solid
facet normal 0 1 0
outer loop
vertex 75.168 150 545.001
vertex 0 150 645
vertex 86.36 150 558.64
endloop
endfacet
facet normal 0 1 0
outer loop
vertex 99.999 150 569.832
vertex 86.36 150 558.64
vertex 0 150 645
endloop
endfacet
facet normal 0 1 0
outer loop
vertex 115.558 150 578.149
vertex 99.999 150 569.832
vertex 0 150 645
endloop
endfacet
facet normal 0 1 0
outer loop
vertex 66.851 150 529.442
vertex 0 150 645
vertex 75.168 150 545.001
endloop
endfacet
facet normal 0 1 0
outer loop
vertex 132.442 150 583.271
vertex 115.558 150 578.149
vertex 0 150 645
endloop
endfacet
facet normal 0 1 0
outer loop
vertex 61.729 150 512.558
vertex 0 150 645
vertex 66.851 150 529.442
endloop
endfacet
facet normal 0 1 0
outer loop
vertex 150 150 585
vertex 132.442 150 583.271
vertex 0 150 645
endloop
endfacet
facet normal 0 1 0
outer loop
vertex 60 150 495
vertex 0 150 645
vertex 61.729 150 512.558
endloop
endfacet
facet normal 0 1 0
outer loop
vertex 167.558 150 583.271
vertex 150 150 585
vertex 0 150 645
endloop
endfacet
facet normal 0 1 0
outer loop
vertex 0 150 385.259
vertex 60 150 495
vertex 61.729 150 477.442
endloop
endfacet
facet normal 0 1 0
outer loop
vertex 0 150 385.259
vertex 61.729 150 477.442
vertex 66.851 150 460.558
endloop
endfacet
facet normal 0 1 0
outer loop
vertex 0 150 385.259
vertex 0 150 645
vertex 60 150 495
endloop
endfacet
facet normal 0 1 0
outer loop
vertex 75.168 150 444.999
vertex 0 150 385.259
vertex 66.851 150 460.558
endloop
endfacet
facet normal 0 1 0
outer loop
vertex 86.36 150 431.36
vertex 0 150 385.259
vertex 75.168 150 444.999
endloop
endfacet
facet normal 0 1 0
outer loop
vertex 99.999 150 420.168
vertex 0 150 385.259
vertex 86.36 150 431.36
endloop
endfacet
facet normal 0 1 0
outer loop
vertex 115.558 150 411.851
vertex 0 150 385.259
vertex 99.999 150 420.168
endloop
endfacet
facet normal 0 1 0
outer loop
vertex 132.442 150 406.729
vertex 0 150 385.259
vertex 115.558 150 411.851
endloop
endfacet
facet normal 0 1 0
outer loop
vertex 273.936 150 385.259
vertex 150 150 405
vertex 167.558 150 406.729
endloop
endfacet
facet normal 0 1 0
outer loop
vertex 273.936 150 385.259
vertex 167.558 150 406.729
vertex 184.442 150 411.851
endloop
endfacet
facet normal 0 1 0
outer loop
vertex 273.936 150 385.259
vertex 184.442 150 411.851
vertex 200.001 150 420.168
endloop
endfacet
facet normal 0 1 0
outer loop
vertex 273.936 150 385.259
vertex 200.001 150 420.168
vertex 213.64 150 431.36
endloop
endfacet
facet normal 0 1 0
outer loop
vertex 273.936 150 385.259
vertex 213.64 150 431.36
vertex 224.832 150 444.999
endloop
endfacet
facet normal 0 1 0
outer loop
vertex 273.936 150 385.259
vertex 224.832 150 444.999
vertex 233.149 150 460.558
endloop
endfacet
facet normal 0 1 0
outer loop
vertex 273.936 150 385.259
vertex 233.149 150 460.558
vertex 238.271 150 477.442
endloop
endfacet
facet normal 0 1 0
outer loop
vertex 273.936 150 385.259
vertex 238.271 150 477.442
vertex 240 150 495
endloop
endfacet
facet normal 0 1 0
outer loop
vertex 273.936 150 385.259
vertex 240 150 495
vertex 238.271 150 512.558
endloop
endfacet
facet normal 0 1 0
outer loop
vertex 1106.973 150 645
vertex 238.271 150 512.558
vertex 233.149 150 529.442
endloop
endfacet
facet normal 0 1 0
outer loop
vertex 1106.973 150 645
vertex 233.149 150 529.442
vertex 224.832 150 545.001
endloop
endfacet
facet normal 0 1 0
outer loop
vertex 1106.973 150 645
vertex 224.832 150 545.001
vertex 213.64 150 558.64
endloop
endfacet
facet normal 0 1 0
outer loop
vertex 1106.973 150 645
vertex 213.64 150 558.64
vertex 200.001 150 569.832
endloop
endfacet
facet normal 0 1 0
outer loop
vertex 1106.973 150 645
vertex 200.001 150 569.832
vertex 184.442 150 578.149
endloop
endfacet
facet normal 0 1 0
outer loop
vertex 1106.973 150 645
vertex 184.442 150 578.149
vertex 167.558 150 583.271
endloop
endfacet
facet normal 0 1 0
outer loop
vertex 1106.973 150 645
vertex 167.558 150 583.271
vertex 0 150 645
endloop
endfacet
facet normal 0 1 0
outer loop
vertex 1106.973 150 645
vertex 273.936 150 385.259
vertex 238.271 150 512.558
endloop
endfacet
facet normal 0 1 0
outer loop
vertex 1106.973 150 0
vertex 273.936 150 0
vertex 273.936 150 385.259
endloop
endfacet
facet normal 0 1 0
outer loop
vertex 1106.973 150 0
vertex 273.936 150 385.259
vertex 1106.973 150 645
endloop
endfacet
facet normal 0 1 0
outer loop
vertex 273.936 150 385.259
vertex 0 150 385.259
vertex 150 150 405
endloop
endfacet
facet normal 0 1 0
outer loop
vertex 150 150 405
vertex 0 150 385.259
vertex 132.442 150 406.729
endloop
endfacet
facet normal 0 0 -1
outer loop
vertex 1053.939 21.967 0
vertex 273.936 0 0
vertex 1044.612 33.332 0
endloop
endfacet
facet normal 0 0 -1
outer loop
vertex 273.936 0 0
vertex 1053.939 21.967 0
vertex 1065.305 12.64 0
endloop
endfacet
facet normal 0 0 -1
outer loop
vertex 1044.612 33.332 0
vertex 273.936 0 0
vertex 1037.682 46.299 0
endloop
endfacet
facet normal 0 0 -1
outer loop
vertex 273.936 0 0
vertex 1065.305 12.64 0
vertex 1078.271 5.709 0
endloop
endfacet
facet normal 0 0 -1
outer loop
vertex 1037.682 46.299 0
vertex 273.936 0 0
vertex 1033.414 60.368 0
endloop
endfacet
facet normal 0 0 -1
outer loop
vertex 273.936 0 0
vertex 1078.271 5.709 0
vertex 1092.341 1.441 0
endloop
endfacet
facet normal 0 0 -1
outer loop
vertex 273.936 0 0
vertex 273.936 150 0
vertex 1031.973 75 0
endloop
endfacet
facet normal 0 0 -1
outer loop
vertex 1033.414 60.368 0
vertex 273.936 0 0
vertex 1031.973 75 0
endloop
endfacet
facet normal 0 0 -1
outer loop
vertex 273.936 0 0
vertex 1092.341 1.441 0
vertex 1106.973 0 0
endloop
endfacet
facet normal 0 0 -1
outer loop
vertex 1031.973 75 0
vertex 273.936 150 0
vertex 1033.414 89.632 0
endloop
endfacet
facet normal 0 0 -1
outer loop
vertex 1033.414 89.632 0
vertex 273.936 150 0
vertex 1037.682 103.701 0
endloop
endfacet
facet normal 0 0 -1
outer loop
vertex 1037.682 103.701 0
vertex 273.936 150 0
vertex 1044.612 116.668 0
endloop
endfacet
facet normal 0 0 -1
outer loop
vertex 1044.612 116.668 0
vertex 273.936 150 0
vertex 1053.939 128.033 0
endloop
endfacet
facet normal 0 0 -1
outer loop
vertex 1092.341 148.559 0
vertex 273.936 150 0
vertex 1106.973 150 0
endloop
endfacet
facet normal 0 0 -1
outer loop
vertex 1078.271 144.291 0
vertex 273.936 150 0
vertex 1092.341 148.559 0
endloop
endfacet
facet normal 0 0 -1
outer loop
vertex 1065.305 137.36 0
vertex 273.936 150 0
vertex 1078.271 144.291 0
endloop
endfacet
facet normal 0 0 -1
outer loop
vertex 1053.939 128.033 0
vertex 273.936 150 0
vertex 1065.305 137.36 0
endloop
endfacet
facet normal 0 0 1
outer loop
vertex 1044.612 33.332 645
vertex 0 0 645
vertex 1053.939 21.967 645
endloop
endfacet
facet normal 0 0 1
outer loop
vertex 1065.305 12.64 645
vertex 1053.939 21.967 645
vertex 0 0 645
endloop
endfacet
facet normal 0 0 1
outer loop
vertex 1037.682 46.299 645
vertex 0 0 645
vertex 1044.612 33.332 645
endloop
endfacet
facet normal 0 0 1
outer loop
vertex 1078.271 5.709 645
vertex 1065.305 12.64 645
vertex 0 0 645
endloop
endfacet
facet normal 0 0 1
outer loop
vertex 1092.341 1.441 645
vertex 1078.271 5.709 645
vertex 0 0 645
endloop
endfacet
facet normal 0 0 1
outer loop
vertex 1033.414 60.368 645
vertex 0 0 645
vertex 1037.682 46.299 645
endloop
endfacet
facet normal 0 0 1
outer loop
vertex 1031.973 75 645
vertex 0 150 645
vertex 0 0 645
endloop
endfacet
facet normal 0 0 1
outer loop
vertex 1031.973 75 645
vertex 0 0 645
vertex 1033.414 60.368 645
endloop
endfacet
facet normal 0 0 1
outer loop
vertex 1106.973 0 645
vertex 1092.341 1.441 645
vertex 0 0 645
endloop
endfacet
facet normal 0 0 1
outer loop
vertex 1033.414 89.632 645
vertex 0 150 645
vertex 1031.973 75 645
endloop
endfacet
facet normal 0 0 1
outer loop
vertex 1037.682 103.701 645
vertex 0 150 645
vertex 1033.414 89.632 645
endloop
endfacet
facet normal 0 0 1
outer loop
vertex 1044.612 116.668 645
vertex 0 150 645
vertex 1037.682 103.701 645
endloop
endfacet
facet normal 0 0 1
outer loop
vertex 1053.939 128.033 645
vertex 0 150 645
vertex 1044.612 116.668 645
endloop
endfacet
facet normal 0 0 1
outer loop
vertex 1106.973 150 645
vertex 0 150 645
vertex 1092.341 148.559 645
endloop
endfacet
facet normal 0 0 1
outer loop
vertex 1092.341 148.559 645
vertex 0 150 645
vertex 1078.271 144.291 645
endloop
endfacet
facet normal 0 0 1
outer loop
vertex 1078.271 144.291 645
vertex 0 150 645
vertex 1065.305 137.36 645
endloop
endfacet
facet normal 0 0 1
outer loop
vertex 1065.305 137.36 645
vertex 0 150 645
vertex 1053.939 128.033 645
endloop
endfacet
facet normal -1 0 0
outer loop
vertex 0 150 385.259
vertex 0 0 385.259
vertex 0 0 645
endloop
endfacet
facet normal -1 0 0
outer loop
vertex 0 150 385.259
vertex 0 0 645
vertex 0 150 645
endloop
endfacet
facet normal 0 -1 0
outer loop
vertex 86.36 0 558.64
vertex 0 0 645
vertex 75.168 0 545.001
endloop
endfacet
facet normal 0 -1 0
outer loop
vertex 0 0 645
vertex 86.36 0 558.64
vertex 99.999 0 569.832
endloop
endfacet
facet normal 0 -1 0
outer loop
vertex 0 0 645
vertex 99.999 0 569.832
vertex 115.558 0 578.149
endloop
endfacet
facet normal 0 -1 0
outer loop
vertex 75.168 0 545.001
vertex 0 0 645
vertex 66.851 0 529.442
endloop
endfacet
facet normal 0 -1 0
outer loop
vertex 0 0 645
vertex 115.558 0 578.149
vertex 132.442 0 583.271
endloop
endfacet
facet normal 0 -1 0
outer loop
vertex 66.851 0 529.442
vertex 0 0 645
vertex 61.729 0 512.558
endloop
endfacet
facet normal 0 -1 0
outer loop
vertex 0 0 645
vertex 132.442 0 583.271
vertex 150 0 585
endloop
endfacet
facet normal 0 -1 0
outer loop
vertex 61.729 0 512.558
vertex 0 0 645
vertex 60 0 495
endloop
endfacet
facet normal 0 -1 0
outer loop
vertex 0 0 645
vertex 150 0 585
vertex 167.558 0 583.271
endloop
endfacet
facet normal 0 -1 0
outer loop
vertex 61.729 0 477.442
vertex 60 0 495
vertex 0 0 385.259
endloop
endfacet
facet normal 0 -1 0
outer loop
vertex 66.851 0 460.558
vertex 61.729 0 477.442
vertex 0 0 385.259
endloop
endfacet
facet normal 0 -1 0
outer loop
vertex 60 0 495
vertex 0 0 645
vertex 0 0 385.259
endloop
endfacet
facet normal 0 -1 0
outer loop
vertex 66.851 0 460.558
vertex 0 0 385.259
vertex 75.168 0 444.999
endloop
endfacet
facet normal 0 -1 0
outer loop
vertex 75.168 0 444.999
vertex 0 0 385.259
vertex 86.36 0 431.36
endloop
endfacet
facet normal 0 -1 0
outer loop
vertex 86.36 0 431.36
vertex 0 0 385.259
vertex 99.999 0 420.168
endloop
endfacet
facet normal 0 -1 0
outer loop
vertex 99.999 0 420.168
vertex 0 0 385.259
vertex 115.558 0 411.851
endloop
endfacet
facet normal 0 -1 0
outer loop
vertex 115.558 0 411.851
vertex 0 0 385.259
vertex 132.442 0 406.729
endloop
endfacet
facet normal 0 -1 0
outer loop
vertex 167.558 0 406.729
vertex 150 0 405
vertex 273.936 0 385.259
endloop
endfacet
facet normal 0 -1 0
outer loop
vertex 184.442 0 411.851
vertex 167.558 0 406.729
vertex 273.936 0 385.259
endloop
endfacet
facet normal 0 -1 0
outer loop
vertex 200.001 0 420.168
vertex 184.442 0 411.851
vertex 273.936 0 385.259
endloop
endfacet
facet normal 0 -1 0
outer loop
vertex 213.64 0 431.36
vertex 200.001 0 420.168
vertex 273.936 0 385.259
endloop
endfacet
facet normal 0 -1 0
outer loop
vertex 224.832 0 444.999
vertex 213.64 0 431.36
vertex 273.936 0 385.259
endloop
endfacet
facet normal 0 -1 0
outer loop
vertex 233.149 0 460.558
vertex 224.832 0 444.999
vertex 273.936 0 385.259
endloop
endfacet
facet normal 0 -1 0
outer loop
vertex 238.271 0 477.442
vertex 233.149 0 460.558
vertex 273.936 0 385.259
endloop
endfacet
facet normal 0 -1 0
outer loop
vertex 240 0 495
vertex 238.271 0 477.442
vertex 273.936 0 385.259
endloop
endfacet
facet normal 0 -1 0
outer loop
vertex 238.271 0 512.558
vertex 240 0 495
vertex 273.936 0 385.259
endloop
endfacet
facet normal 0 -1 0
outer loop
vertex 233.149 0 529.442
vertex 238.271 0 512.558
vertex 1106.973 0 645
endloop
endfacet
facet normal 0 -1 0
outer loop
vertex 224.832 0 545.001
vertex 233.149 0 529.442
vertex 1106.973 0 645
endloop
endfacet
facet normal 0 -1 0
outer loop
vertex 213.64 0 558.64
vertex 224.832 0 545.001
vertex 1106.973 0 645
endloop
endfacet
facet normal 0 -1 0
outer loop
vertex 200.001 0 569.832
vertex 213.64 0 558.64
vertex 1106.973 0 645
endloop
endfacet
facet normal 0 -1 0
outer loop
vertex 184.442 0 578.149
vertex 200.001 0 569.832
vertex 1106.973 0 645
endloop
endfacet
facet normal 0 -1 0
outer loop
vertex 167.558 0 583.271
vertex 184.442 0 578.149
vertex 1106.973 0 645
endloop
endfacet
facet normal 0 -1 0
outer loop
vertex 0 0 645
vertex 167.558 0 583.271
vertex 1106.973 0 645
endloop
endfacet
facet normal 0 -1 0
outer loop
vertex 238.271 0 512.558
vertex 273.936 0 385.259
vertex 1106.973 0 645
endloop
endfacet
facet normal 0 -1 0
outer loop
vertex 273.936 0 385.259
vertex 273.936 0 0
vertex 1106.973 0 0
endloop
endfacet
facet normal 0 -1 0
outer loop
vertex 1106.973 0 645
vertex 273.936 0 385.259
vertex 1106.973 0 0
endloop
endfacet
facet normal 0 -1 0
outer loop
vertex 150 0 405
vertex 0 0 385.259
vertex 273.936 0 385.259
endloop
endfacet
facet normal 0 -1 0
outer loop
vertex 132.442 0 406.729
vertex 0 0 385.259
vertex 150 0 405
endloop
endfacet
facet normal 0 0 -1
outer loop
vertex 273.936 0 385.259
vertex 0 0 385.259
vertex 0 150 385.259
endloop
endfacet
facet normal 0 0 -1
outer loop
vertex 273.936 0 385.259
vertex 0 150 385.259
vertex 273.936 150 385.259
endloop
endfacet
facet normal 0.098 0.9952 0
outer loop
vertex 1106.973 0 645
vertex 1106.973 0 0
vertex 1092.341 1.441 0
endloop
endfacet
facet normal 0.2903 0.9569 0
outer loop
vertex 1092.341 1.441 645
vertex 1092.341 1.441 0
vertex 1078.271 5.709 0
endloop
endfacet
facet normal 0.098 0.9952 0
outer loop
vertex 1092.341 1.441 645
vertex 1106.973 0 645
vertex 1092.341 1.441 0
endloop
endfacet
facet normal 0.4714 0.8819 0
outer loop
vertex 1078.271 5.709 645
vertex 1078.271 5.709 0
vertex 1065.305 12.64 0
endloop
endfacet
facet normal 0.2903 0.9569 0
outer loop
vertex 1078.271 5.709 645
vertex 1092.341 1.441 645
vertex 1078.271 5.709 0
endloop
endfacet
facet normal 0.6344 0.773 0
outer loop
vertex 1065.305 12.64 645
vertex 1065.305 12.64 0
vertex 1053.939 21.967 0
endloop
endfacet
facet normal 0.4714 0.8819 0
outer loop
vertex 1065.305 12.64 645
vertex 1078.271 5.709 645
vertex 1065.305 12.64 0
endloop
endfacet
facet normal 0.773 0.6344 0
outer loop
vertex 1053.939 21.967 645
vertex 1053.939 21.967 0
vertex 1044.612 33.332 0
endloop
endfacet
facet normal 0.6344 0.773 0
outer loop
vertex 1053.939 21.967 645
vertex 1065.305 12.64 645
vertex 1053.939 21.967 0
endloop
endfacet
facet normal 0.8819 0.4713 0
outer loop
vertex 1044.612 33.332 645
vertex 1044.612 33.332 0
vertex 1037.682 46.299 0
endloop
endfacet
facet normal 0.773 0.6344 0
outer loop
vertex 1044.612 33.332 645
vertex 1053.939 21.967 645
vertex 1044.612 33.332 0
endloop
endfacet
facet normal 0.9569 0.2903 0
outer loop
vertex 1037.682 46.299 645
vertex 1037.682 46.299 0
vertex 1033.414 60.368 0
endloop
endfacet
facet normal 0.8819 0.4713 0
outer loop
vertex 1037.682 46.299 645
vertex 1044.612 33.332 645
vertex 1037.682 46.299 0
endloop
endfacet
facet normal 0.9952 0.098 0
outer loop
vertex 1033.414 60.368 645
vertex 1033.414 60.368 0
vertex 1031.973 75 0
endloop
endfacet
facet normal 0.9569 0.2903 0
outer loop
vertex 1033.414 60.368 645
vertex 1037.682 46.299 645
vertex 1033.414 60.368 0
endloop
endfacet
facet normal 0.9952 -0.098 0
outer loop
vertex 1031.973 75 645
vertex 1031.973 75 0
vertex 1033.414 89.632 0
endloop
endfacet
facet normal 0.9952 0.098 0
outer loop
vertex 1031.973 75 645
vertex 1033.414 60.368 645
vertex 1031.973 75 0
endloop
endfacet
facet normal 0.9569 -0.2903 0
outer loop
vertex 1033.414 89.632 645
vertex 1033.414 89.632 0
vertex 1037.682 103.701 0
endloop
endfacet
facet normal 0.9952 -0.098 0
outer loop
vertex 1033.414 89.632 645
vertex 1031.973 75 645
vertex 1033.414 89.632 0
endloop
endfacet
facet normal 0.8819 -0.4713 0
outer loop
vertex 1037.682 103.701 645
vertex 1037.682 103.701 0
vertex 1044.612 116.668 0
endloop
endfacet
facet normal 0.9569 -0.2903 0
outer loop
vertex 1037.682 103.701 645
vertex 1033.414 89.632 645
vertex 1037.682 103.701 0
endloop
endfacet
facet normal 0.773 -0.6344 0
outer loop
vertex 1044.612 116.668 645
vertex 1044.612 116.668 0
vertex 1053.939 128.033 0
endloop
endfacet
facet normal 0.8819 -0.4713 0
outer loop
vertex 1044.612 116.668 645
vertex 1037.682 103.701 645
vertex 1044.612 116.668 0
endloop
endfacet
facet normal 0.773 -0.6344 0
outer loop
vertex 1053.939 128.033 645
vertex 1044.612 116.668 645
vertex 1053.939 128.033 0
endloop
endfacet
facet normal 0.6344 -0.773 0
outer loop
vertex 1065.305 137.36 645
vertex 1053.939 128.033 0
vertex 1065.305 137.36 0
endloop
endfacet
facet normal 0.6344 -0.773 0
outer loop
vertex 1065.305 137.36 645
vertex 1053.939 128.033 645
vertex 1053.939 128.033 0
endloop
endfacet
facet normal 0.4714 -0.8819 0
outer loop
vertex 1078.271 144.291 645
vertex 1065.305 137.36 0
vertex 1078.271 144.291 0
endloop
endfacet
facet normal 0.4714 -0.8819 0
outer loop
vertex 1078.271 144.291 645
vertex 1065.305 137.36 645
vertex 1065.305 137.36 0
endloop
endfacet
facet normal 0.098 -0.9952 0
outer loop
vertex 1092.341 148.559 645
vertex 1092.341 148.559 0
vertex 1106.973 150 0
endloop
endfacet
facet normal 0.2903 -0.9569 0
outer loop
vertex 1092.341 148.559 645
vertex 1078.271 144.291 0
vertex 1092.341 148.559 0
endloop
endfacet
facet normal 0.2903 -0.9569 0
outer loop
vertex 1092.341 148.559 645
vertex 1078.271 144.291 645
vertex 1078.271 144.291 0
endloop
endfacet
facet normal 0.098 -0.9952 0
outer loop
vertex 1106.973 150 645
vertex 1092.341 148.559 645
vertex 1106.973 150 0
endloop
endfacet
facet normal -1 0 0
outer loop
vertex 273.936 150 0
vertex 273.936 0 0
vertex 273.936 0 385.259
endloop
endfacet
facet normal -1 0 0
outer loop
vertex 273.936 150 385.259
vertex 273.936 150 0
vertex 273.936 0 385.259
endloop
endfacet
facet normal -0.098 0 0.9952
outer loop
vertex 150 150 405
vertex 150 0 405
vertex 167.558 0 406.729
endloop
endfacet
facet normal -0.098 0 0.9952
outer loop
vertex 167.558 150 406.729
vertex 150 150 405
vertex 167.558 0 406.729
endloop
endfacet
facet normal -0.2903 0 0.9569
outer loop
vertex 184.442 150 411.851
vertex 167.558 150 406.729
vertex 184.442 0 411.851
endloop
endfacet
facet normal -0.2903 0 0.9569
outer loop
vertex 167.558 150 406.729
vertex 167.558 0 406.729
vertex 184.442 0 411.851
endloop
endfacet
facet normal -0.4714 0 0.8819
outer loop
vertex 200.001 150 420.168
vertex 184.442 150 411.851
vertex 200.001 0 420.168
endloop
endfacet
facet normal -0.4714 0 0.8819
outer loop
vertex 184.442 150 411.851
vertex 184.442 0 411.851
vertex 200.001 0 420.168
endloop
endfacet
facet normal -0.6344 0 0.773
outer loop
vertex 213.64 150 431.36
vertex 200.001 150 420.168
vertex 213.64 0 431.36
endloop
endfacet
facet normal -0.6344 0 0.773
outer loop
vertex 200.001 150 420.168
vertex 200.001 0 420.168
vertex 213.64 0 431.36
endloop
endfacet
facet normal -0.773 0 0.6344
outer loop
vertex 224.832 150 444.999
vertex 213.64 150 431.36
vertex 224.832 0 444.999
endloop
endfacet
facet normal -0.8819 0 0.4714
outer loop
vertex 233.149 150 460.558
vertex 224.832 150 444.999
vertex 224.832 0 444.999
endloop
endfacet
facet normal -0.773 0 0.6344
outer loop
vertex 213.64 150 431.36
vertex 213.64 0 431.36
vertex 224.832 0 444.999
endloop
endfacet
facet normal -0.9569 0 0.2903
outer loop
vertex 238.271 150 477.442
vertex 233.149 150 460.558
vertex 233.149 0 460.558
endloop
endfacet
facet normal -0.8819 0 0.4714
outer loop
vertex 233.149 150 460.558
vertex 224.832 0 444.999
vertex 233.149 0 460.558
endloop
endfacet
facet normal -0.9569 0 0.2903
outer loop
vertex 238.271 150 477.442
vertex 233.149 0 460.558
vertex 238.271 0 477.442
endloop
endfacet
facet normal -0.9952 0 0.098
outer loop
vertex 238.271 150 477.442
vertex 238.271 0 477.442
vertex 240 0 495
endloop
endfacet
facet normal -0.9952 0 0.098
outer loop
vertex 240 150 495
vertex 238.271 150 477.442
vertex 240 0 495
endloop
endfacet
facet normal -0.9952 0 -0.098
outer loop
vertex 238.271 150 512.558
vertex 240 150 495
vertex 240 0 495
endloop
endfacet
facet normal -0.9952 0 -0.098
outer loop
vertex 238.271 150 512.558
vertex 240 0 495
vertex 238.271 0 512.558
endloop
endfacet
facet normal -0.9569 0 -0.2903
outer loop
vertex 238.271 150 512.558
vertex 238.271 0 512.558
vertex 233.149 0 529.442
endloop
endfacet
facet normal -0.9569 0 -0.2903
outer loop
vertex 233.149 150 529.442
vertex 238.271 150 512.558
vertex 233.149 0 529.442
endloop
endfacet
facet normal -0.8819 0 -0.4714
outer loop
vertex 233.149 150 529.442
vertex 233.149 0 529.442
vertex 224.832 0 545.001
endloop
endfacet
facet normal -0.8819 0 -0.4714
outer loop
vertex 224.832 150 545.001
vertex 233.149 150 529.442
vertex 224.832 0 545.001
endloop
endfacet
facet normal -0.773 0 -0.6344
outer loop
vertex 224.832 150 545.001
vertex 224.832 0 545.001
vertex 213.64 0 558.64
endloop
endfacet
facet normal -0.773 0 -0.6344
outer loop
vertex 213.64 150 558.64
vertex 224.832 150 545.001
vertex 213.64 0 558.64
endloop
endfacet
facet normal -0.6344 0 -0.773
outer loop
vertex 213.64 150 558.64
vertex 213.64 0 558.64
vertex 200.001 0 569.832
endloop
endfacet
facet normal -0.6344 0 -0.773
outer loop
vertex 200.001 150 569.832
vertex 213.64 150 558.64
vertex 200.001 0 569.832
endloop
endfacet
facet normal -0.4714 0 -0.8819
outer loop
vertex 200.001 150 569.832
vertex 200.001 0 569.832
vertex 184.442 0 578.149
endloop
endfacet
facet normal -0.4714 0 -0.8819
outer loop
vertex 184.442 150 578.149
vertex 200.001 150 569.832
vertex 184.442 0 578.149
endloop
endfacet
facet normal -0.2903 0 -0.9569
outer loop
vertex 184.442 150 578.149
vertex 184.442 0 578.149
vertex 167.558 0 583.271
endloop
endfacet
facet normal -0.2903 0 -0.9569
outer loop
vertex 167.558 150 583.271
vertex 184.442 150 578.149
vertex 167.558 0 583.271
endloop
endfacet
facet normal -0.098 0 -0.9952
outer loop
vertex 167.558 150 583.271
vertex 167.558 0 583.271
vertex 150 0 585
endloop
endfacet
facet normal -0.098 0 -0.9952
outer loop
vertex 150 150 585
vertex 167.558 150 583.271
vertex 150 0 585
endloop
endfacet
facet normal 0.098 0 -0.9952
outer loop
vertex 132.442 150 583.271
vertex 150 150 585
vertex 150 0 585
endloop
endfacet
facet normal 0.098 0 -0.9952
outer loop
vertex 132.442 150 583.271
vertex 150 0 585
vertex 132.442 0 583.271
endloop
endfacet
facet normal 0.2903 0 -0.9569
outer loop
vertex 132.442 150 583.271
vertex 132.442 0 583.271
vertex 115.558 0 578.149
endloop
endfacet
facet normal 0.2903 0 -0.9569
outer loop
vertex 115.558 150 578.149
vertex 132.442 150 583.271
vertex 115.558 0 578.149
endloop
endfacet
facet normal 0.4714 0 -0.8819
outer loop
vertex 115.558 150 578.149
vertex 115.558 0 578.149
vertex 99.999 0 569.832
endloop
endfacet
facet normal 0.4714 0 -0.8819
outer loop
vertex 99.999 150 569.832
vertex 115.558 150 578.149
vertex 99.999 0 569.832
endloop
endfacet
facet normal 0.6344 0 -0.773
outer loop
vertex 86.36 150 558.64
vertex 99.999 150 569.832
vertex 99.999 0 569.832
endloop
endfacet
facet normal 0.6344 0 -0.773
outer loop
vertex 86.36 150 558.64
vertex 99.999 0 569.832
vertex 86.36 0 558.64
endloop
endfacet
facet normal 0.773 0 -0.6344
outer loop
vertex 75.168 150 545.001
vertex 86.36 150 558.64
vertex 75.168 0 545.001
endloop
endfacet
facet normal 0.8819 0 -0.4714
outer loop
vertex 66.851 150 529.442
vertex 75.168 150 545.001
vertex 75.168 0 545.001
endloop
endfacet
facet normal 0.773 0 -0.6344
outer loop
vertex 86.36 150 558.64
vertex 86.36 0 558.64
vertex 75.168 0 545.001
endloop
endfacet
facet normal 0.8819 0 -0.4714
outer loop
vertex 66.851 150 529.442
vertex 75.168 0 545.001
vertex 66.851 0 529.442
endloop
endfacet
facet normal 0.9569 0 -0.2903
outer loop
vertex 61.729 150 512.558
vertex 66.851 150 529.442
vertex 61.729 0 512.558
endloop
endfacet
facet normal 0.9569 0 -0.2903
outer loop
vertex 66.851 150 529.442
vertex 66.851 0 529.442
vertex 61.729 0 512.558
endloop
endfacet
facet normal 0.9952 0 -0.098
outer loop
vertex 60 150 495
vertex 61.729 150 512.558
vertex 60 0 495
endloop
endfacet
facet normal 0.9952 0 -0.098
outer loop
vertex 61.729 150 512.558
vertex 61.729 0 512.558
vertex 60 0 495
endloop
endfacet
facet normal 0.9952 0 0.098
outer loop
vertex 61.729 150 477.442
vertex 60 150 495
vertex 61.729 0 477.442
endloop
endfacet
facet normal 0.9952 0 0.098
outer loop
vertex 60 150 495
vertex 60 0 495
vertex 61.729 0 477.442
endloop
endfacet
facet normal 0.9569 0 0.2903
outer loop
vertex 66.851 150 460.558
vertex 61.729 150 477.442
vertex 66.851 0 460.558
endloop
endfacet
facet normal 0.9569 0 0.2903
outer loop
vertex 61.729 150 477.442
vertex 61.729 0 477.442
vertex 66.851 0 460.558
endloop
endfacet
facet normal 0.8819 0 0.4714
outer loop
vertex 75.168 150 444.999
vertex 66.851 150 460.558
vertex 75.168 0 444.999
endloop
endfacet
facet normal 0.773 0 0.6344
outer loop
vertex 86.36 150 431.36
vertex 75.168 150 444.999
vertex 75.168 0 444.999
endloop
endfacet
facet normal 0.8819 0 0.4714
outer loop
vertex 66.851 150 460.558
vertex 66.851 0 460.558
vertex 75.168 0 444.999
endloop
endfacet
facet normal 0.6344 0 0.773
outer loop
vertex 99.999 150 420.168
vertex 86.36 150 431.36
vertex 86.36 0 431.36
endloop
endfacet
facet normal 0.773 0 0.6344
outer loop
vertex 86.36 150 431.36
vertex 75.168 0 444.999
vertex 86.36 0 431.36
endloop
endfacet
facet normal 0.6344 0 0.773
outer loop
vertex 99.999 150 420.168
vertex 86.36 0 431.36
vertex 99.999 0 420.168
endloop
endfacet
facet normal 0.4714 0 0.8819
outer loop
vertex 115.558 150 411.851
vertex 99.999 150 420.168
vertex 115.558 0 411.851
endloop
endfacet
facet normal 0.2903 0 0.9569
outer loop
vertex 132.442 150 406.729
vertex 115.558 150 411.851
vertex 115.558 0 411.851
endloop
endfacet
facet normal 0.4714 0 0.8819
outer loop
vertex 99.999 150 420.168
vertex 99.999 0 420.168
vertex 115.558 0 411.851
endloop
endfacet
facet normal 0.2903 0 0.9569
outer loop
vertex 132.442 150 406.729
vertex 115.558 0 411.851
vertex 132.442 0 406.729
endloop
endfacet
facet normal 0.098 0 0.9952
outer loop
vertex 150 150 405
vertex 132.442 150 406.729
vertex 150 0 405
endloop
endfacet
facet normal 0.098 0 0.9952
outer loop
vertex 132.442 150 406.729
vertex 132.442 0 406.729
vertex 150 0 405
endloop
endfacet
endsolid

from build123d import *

# Parameters (mm, degrees)
SKETCH1_W           = 1106.97250468
SKETCH1_H           = 150
BOSS_EXTRUDE1_DEPTH = 645
SKETCH2_R           = 90
CUT_EXTRUDE1_DEPTH  = 1290.927566229
SKETCH3_W           = 273.936328983
SKETCH3_H           = 385.258703225
CUT_EXTRUDE2_DEPTH  = 1290.927566229
CUT_EXTRUDE3_DEPTH  = 1290.927566229


with BuildPart() as part:
    # Sketch1 → Boss-Extrude1 (new body)
    with BuildSketch(Plane.XY):
        with Locations((553.48625234, 75)):
            Rectangle(SKETCH1_W, SKETCH1_H)
    extrude(amount=BOSS_EXTRUDE1_DEPTH)

    # Sketch2 → Cut-Extrude1 (cut, through all)
    with BuildSketch(Plane.XZ):
        with Locations(Location((150, 495, 0), (0, 0, 270))):
            Circle(SKETCH2_R)
    extrude(amount=-CUT_EXTRUDE1_DEPTH, mode=Mode.SUBTRACT)

    # Sketch3 → Cut-Extrude2 (cut, through all)
    with BuildSketch(Plane.XZ):
        with Locations((136.968164492, 192.629351613)):
            Rectangle(SKETCH3_W, SKETCH3_H)
    extrude(amount=-CUT_EXTRUDE2_DEPTH, mode=Mode.SUBTRACT)

    # Sketch5 → Cut-Extrude3 (cut, through all)
    with BuildSketch(Plane.XY.offset(645)):
        with BuildLine():
            Line((1106.97250468, 150), (1106.97250468, 0))
            ThreePointArc((1106.97250468, 0), (1031.97250468, 75), (1106.97250468, 150))
        make_face()
    extrude(amount=-CUT_EXTRUDE3_DEPTH, mode=Mode.SUBTRACT)


solid = part.part
